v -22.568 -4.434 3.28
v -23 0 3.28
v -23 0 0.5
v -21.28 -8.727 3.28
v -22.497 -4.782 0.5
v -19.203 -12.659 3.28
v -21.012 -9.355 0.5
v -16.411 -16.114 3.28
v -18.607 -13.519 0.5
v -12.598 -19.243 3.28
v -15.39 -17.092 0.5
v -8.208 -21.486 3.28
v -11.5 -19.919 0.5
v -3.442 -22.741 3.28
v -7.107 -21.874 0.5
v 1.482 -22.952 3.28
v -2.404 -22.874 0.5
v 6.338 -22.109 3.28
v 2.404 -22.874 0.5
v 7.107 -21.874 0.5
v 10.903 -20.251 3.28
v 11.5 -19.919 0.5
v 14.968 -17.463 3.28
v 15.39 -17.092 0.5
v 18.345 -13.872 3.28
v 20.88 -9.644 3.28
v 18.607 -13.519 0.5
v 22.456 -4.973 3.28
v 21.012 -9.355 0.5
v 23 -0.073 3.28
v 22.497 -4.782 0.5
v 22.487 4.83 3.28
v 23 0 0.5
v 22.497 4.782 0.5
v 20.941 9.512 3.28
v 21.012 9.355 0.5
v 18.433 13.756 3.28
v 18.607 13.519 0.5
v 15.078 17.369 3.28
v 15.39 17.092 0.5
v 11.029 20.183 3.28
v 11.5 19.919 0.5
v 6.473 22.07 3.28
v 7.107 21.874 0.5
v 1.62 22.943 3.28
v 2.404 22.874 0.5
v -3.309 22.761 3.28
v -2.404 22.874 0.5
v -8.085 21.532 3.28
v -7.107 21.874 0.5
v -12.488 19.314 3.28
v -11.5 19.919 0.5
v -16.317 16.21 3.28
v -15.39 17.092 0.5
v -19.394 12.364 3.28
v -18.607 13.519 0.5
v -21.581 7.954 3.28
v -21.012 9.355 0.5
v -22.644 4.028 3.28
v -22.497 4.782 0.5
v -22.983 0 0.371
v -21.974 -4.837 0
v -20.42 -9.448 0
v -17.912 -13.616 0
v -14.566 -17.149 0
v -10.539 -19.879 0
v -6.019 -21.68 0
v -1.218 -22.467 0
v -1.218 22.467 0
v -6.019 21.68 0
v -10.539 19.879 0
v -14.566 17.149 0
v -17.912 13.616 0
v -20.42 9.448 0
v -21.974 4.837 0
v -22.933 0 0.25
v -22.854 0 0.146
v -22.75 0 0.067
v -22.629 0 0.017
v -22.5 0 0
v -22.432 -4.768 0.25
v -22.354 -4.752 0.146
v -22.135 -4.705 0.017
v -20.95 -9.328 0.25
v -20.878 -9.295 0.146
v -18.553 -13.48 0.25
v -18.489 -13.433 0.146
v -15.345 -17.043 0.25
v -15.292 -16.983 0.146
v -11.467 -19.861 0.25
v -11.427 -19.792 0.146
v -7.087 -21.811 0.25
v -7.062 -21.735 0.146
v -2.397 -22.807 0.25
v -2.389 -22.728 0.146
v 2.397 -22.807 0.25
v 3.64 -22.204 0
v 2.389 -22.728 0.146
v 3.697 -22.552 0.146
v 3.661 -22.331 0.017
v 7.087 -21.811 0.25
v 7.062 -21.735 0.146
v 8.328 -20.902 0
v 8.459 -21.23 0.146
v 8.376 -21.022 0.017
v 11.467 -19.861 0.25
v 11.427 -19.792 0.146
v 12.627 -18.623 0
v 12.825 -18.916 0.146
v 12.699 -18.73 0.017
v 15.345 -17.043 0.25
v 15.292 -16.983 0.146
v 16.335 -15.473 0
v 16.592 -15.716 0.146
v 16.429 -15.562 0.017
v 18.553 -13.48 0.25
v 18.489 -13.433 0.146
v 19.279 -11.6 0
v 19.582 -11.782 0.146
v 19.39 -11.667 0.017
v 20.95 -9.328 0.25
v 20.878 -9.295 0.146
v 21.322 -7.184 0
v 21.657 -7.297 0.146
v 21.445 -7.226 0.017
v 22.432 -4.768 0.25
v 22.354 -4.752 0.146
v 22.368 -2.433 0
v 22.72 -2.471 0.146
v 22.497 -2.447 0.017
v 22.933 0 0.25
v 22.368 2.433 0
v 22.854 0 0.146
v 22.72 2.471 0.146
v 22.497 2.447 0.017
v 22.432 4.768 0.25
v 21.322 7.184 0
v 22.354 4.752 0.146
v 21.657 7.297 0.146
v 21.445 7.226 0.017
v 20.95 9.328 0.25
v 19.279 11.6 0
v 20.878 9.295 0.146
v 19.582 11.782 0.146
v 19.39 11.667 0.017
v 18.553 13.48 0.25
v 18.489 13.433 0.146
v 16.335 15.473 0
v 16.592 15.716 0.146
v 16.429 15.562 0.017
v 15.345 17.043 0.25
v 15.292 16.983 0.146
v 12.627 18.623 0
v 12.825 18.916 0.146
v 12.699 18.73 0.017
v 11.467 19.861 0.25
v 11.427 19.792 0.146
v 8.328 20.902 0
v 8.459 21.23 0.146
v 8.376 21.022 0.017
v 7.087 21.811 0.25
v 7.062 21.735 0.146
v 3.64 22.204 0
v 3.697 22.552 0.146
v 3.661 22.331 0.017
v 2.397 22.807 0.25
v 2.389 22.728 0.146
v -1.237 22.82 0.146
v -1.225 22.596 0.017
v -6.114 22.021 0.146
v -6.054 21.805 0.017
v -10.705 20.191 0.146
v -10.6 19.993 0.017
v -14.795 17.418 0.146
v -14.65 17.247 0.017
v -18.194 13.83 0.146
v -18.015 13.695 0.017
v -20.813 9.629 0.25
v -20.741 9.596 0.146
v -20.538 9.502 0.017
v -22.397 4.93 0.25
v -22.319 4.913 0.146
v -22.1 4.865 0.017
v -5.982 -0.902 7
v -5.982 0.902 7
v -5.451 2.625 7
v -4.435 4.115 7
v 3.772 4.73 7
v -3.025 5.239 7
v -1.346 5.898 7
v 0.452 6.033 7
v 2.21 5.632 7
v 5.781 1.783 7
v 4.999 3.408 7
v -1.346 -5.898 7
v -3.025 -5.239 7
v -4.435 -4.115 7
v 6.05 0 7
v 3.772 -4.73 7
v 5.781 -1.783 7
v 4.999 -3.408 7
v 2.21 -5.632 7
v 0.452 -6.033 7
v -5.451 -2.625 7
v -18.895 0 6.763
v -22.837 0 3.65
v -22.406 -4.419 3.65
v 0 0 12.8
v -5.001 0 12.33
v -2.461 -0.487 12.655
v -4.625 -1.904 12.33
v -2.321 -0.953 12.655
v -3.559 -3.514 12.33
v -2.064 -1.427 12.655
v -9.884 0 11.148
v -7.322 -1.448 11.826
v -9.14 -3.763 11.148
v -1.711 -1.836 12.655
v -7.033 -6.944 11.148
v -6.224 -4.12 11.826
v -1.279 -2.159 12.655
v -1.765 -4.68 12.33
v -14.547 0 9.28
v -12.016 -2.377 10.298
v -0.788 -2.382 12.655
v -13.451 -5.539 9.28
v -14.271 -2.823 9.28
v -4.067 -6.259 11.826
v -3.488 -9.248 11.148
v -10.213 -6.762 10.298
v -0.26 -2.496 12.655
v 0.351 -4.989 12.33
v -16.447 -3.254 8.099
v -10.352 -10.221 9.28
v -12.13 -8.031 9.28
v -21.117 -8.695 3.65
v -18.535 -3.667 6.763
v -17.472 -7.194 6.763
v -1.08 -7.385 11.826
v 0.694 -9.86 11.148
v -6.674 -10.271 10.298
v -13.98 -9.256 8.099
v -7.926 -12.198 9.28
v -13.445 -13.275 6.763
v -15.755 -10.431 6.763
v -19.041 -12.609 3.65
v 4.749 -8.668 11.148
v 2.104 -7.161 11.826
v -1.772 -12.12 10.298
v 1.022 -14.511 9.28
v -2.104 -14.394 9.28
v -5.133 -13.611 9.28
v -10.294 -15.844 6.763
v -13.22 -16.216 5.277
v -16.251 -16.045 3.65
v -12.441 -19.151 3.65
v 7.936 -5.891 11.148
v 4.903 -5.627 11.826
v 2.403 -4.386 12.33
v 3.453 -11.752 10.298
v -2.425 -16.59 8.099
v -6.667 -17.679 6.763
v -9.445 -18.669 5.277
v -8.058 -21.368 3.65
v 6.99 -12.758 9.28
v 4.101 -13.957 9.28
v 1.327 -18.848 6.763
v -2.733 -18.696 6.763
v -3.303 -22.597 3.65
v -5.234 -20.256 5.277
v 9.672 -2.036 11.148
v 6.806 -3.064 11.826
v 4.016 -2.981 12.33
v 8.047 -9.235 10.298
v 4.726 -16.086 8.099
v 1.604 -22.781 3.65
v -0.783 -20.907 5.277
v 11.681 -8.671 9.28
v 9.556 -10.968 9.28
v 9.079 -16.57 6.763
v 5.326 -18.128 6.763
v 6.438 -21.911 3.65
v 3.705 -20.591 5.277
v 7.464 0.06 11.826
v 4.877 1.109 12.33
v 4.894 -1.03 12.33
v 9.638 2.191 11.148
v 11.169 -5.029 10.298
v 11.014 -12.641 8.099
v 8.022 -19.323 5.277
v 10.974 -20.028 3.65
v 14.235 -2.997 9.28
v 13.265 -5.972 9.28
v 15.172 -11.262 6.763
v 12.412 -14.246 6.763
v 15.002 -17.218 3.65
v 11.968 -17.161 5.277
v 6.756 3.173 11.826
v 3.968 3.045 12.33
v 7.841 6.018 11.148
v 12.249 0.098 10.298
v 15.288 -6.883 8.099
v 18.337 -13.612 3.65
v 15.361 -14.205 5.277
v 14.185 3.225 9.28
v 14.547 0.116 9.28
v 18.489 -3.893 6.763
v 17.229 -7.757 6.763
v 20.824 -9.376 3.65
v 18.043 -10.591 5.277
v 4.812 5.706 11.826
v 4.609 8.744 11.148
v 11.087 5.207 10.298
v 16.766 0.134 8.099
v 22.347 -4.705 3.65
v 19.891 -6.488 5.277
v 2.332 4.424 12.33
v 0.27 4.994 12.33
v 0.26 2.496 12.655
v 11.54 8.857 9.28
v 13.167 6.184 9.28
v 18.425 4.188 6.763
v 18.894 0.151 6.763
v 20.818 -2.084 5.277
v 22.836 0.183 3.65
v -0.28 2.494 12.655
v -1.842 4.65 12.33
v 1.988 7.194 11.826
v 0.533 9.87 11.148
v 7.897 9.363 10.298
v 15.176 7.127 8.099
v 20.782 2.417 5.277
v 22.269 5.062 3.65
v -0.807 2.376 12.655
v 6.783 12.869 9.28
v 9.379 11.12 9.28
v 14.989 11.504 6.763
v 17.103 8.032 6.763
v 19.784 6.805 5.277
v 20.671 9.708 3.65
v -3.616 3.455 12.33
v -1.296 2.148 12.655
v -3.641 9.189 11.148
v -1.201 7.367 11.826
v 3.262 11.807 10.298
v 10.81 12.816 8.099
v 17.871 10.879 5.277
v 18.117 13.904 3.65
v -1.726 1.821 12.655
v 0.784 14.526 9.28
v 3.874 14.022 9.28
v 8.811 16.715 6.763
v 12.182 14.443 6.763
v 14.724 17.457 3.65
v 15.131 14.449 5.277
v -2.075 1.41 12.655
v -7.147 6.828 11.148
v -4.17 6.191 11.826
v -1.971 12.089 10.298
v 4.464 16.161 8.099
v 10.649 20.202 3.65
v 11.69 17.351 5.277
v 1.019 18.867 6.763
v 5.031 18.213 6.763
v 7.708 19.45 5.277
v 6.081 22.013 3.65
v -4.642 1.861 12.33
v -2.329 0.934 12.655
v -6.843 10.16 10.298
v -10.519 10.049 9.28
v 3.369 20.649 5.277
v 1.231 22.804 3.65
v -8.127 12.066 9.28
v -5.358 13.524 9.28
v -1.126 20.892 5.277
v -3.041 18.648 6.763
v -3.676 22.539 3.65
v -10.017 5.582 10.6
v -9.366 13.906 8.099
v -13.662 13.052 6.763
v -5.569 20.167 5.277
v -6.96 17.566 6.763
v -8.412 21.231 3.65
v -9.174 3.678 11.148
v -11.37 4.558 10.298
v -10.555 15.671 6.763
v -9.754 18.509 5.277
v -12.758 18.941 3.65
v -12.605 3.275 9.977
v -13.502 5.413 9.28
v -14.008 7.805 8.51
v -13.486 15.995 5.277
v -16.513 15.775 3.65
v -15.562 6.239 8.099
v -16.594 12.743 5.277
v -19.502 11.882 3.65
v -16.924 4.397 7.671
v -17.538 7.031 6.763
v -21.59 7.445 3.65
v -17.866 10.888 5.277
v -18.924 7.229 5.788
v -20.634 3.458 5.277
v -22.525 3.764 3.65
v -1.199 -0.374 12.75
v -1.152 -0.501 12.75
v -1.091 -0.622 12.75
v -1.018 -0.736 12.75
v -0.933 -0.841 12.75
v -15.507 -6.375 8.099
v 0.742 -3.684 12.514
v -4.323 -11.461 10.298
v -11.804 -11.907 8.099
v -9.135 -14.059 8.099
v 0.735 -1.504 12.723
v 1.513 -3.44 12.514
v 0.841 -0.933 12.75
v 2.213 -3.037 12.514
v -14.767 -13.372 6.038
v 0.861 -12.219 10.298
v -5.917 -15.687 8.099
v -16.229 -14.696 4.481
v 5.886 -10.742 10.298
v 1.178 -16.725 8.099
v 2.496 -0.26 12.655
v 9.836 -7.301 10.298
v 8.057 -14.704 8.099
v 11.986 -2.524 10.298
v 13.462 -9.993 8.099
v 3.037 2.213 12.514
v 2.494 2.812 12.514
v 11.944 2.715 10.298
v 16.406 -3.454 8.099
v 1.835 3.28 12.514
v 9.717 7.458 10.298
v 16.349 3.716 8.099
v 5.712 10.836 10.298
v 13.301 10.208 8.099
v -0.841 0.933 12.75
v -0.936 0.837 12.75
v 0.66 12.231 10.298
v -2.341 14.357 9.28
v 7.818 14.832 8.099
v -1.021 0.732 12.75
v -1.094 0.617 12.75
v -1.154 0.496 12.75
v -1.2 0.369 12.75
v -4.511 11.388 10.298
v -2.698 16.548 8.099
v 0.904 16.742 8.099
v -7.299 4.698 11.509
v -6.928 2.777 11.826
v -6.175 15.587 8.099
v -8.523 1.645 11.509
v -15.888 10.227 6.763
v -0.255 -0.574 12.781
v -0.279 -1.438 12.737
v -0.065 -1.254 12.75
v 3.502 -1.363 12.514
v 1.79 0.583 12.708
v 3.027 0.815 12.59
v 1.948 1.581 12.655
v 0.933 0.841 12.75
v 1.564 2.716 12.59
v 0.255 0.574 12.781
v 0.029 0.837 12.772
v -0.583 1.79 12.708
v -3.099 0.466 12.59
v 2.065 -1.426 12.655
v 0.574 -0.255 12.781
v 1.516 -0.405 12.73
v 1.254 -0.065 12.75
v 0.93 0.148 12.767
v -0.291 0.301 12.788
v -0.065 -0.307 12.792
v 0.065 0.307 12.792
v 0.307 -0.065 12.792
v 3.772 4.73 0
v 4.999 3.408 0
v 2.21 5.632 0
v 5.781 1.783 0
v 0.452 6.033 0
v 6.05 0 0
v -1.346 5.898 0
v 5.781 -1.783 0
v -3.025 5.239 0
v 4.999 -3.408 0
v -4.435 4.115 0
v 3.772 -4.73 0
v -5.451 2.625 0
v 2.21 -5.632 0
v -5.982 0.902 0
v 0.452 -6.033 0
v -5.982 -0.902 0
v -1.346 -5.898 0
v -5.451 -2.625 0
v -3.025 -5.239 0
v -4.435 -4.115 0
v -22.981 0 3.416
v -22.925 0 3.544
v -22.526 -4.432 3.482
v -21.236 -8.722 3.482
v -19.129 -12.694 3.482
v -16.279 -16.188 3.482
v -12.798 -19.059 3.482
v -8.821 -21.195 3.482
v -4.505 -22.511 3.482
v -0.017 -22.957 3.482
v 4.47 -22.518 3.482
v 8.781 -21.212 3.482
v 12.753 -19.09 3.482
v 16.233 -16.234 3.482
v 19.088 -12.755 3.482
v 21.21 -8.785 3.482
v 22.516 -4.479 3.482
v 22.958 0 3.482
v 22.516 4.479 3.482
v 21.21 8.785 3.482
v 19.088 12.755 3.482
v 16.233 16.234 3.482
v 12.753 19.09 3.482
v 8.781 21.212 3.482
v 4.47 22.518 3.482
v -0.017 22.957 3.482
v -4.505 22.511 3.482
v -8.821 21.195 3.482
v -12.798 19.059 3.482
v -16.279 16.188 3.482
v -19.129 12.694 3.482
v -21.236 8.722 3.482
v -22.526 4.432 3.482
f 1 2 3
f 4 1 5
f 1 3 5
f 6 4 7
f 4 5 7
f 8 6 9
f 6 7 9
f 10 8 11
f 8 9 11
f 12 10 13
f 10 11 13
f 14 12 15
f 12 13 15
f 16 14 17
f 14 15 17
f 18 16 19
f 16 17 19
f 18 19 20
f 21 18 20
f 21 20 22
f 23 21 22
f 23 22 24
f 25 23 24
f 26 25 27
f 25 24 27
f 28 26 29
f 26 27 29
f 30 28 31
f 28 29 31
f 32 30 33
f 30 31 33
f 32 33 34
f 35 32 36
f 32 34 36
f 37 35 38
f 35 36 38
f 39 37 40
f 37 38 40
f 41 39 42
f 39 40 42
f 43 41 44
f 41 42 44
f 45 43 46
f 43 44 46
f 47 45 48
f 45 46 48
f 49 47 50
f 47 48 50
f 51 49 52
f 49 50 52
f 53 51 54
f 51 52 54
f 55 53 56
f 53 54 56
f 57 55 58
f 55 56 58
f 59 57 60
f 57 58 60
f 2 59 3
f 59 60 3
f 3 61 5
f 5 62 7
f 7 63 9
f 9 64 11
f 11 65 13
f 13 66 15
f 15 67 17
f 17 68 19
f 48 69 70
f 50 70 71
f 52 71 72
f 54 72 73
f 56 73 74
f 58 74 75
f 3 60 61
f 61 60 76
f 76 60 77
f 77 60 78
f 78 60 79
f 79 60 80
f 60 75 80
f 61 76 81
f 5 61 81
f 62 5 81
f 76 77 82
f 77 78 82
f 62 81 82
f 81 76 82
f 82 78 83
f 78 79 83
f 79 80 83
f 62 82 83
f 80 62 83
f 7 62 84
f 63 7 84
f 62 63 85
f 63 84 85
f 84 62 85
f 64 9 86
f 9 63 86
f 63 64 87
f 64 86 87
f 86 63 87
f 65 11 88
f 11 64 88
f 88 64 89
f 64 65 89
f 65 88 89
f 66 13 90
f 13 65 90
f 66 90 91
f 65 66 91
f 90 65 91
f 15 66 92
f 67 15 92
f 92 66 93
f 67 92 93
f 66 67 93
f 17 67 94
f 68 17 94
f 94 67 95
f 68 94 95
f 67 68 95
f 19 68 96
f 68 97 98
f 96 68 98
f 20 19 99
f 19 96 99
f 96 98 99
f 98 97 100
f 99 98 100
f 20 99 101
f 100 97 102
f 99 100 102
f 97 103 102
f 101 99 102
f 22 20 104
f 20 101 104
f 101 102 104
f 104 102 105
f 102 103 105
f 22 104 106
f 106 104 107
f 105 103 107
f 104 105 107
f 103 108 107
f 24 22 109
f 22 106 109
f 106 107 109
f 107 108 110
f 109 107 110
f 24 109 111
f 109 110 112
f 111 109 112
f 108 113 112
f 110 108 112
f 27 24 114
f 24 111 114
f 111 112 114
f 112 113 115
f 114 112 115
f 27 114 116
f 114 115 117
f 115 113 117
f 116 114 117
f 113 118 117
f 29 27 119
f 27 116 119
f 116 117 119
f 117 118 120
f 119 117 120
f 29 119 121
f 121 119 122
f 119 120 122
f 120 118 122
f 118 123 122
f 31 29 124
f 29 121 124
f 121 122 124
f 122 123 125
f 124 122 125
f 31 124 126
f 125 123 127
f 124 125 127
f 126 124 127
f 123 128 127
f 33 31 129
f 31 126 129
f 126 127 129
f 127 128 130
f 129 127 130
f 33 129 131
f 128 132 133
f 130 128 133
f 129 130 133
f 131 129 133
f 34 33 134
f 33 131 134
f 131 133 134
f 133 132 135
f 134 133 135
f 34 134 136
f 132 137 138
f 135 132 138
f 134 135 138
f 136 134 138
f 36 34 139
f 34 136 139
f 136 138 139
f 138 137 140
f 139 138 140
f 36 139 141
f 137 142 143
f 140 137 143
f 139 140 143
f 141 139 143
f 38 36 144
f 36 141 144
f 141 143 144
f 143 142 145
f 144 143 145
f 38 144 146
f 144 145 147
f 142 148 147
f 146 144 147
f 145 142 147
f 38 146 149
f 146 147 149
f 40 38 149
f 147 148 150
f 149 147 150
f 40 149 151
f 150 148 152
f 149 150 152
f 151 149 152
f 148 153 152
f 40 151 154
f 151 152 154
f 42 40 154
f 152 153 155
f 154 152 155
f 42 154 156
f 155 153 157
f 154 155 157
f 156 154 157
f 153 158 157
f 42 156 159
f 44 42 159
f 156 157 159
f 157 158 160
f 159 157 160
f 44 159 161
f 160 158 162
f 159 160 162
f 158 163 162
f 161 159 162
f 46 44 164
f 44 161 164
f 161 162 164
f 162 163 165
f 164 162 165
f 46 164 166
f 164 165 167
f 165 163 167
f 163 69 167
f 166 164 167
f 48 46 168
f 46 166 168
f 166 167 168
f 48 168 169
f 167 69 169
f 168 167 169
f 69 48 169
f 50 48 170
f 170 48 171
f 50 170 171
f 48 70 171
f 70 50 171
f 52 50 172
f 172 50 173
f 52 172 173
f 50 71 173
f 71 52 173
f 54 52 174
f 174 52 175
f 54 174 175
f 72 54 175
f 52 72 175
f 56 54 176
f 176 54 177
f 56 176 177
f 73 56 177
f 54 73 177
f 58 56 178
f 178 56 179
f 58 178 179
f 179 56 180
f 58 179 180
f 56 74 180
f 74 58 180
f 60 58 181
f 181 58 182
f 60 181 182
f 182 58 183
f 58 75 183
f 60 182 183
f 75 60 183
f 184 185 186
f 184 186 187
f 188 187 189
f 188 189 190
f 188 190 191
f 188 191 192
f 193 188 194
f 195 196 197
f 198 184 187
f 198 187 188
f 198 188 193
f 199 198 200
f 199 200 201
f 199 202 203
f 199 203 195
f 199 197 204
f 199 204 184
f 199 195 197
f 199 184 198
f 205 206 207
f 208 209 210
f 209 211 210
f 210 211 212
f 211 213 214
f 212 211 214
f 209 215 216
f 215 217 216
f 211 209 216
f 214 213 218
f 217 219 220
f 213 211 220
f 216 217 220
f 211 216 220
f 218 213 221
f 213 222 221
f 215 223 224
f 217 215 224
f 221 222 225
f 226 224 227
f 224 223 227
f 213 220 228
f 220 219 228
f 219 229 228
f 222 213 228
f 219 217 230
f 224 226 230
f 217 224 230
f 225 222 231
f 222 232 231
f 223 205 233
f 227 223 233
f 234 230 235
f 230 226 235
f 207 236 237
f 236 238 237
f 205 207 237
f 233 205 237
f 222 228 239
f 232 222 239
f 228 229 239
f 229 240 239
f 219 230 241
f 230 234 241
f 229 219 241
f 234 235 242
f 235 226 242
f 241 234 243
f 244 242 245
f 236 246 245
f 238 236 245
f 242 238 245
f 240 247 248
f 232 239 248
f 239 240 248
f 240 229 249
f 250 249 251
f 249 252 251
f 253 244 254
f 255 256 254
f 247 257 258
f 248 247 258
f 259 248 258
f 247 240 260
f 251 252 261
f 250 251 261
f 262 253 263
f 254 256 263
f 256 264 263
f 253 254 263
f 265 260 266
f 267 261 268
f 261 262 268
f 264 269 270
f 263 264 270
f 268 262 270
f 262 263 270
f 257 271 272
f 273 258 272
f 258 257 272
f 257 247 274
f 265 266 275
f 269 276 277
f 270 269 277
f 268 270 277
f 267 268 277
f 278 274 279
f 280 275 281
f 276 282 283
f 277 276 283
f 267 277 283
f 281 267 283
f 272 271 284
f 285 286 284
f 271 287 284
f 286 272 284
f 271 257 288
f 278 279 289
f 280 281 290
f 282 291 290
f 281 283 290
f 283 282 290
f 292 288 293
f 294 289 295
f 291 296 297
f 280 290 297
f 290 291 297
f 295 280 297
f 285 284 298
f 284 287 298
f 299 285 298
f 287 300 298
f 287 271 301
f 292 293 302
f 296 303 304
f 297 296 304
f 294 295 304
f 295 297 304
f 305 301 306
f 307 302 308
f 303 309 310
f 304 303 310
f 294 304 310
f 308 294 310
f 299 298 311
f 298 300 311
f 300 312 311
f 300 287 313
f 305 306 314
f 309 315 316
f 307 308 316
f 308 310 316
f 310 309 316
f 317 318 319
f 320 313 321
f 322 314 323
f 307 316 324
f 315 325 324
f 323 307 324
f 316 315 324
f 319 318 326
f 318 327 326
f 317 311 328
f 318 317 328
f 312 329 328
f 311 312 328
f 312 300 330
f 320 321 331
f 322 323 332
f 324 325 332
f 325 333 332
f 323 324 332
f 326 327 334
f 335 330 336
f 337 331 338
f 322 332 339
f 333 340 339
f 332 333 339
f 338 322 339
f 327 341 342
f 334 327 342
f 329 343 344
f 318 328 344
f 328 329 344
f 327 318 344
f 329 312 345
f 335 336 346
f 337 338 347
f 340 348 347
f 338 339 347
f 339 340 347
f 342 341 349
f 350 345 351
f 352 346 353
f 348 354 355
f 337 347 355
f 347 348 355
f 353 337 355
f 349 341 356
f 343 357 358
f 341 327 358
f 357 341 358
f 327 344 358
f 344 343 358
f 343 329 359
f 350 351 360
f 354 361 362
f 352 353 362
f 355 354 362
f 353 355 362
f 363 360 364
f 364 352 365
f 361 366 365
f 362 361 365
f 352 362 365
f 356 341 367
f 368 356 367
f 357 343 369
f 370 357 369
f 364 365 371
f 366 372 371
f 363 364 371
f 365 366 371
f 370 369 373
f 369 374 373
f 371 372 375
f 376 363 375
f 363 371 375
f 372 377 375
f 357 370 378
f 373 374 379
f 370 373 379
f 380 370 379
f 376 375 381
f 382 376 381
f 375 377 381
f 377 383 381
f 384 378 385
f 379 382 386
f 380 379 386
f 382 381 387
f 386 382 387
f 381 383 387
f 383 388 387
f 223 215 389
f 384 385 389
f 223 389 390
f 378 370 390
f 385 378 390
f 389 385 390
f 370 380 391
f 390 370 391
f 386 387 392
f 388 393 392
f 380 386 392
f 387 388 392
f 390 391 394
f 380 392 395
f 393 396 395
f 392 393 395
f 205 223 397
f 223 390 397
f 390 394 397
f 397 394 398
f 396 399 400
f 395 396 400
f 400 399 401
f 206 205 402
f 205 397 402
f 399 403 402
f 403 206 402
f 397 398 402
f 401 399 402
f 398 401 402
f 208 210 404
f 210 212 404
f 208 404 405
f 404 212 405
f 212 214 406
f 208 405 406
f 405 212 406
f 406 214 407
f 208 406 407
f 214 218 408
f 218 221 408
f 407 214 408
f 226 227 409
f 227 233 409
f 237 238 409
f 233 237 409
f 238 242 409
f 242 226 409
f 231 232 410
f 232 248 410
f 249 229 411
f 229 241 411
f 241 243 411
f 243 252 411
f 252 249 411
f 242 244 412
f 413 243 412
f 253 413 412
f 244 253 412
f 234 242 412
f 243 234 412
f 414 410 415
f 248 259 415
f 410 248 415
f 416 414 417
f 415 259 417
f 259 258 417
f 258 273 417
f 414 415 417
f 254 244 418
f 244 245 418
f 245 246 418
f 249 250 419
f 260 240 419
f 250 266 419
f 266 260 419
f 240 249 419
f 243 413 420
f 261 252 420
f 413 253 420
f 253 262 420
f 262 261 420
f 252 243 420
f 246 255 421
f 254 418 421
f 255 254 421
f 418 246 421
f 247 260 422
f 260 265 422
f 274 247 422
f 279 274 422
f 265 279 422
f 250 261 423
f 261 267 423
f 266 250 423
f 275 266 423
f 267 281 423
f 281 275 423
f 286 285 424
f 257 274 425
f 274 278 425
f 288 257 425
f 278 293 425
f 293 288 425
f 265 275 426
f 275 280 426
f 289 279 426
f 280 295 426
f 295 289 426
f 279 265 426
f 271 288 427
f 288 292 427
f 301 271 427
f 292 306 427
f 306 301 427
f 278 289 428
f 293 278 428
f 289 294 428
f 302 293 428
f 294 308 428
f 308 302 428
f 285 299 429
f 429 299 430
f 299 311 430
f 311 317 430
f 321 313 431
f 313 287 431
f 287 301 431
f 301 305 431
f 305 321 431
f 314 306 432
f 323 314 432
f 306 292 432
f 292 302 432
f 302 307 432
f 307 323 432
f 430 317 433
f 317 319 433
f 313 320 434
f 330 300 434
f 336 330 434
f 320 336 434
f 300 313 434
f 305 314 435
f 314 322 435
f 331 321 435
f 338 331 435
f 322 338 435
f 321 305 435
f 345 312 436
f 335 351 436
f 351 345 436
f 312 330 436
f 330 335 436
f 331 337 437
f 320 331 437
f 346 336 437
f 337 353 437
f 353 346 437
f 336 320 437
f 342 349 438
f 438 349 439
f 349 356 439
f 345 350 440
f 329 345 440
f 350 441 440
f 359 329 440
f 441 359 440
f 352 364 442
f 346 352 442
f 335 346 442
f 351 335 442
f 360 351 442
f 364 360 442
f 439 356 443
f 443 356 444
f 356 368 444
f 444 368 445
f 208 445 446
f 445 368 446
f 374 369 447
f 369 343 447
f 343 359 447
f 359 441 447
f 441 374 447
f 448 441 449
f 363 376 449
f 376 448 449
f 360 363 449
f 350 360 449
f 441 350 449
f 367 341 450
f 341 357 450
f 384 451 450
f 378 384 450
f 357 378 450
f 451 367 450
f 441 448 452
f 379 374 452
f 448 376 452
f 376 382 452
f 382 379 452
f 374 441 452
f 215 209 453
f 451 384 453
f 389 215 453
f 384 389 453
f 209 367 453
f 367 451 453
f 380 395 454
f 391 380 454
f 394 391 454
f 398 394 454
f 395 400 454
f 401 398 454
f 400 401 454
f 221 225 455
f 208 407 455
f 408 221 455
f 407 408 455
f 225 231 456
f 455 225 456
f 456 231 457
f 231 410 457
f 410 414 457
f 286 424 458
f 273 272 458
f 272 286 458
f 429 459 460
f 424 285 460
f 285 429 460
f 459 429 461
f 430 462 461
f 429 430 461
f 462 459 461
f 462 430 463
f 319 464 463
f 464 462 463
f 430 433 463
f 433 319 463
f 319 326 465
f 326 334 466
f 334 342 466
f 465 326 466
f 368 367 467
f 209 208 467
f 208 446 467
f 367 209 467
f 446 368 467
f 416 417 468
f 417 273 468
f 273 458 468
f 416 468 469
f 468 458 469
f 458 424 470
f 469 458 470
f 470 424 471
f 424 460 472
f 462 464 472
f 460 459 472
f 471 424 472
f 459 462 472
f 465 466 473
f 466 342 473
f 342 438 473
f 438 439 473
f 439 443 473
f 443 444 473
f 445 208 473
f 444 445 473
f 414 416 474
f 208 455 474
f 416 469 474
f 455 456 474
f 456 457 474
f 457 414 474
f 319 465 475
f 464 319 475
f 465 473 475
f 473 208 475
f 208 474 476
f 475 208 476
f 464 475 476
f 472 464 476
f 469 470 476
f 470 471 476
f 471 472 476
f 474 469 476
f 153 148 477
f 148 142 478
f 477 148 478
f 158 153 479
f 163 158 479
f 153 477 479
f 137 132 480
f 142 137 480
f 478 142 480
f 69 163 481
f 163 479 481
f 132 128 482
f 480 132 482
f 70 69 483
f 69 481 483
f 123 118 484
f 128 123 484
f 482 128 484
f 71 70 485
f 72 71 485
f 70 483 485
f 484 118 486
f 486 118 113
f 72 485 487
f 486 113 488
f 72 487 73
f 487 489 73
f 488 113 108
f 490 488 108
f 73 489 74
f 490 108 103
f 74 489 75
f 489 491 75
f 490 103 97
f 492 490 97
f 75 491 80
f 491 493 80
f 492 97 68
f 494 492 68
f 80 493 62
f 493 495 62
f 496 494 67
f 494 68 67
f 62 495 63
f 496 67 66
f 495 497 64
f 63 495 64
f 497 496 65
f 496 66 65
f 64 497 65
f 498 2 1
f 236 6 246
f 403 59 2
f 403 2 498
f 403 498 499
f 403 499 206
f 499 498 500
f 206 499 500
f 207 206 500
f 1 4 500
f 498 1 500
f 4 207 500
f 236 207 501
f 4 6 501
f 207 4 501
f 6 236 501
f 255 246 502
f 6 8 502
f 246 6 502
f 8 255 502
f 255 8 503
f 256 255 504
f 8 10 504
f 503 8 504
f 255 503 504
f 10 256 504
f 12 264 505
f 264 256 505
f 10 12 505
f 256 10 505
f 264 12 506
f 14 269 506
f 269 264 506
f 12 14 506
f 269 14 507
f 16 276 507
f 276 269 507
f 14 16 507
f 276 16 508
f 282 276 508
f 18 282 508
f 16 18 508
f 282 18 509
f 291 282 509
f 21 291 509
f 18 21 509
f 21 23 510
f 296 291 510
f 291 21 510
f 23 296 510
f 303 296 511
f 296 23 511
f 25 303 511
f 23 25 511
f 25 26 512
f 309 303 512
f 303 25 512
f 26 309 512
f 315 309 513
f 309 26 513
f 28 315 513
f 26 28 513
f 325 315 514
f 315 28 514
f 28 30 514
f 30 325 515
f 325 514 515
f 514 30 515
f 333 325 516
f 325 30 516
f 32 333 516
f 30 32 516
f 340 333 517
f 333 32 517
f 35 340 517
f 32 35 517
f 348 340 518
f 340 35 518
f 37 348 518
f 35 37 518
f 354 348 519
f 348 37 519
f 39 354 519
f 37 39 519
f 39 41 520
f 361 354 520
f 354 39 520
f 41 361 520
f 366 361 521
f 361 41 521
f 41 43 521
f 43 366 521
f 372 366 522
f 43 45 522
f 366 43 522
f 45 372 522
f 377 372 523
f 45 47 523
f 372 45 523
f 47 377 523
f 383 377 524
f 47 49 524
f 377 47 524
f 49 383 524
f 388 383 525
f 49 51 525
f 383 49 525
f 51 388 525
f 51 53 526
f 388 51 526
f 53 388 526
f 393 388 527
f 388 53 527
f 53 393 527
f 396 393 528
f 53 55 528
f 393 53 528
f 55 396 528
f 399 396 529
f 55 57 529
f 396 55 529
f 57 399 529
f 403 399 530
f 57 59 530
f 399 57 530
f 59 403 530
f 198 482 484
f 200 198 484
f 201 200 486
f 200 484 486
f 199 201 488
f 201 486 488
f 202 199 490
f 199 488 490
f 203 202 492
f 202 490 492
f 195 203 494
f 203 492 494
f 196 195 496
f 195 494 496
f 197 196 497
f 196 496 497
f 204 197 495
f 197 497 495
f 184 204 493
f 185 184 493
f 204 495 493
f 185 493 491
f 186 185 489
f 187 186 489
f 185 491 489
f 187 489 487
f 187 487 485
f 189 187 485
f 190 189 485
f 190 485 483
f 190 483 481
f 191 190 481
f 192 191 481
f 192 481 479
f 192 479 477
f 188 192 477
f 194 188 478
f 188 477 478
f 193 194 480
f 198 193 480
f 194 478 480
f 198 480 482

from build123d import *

# Parameters (mm, degrees)
F2_R     = 6.05
F3_DEPTH = 7
F4_R     = 0.5


with BuildPart() as f1:
    # F0 (on Front) → F1 (revolve)
    with BuildSketch(Plane.XZ):
        with BuildLine():
            Line((-23, 3.5), (-23, 0))
            Line((-23, 0), (0, 0))
            Line((0, 0), (0, 12.8))
            ThreePointArc((0, 12.8), (-12.351657, 10.256248), (-23, 3.5))
        make_face()
    revolve(axis=Axis((0, 0, 14.962358), (0, 0, 1)))

    # F2 (on face) → F3 (cut)
    with BuildSketch(Plane(origin=(0, 0, 0), x_dir=(1, 0, 0), z_dir=(0, 0, -1))):
        Circle(F2_R)
    extrude(amount=-F3_DEPTH, mode=Mode.SUBTRACT)

    # F4
    f4_edges = [f1.edges().sort_by_distance(p)[0] for p in [
        (23, 0, 0),
        (23, 0, 3.5),
    ]]
    fillet(f4_edges, radius=F4_R)


solid = f1.part
